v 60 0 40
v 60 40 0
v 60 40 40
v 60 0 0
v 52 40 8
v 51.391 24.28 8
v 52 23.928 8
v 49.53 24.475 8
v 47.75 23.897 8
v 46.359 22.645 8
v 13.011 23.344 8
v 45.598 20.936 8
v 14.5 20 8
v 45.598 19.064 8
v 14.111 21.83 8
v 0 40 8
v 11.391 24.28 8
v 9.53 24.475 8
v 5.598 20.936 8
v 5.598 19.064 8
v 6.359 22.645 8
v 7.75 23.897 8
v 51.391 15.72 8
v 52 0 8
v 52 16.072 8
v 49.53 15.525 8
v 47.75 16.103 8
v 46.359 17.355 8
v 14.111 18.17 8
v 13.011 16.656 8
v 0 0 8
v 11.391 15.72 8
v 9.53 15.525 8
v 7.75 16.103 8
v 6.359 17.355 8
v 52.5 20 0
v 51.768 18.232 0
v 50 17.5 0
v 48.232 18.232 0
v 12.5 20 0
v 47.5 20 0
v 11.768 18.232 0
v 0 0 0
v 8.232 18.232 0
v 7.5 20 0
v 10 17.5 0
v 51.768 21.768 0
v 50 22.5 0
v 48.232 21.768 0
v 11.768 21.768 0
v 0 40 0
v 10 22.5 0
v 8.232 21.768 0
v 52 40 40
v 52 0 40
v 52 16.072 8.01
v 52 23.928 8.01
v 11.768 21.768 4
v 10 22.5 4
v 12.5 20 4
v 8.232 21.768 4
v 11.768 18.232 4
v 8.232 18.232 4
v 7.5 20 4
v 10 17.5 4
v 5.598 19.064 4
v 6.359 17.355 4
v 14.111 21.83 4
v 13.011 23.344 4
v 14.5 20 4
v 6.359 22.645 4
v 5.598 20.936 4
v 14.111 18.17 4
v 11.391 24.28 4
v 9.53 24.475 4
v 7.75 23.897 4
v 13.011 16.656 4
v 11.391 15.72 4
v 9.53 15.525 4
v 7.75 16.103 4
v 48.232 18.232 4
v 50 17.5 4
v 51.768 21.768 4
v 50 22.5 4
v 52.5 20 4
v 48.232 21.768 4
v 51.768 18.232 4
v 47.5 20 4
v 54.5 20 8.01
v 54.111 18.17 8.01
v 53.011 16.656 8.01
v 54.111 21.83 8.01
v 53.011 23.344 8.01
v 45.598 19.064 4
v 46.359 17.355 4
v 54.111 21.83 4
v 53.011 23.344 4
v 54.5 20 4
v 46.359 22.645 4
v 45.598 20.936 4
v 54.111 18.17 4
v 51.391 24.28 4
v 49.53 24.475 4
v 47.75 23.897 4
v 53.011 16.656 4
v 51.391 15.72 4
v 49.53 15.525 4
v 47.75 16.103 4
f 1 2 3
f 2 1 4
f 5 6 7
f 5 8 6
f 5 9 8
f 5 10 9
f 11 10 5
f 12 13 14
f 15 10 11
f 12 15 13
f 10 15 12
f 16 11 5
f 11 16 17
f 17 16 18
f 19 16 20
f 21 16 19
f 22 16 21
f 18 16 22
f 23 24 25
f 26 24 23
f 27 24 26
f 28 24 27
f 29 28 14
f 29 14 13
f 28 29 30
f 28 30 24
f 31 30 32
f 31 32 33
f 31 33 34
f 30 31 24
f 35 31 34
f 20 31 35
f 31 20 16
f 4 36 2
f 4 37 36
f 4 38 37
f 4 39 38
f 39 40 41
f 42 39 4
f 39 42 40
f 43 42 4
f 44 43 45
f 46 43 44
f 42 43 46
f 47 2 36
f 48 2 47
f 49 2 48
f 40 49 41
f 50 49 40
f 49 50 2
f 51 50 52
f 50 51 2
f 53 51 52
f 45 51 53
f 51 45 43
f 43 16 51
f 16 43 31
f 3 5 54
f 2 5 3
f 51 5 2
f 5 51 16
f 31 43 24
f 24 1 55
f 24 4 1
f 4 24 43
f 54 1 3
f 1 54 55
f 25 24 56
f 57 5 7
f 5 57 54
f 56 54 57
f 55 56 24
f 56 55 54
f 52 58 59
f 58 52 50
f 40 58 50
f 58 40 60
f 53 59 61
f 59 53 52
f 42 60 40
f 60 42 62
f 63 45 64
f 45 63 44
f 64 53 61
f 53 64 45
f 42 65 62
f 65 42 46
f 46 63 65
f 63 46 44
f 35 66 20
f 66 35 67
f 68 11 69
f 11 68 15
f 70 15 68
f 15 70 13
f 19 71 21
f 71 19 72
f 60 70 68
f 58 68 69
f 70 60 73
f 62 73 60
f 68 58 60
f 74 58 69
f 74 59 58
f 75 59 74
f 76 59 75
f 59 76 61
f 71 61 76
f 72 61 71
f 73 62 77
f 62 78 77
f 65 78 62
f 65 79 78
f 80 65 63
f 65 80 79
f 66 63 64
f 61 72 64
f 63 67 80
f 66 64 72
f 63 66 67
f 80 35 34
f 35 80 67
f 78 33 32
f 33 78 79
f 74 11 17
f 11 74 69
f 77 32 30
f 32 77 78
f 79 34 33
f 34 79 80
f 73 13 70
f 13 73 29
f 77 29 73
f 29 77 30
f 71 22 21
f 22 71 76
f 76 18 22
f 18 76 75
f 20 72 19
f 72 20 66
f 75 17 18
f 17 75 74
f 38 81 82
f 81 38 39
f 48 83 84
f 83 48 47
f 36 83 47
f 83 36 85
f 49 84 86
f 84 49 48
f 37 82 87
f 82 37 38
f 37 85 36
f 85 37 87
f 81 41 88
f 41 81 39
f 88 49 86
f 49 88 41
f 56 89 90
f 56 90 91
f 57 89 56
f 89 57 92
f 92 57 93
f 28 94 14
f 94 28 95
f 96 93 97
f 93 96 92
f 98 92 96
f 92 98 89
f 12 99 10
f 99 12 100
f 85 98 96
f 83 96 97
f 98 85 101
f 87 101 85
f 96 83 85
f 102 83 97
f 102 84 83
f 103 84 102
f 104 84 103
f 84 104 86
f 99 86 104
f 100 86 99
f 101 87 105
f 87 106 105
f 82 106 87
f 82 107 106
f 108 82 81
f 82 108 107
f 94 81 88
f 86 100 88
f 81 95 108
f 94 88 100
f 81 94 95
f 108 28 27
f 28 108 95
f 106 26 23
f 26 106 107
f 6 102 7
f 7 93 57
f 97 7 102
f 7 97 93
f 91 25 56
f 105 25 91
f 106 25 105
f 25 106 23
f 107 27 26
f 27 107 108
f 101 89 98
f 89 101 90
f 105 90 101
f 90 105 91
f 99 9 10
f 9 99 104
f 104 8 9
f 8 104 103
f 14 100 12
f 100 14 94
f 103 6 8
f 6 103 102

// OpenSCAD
// file: ../lib/hole.scad
// lib/hole.scad — 公共孔模块
// 放在 z = 0 平面上方打孔，depth 默认穿透 100mm
module hole(x = 0, y = 0, d = 3, depth = 100, counterbore = 0, cb_depth = 3) {
  // counterbore > 0 时生成沉头孔（沉头直径由调用方用 d 推或自行扩展）
  translate([x, y, -0.01])
    cylinder(h = depth + 0.02, d = d);
}

module counterbore_hole(x = 0, y = 0, d = 3, cb_d = 0, cb_depth = 3, depth = 100) {
  // d      : 通孔直径
  // cb_d   : 沉头直径（0 = 普通孔）
  // cb_depth: 沉头深度
  union() {
    translate([x, y, -0.01]) cylinder(h = depth + 0.02, d = d);
    if (cb_d > d)
      translate([x, y, depth - cb_depth])
        cylinder(h = cb_depth + 0.01, d = cb_d);
  }
}

// 圆周孔阵: n 个孔均布在半径 r 上
module hole_circle(center_x = 0, center_y = 0, r = 20, n = 4, d = 3, depth = 100) {
  for (i = [0:n-1])
    hole(x = center_x + r * cos(i * 360 / n),
         y = center_y + r * sin(i * 360 / n),
         d = d, depth = depth);
}

// 简单倒角方块（用 minkowski + sphere）
module chamfered_box(size, c = 1) {
  minkowski() {
    scale([1,1,1]) {
      // 先生成略小的实体
      offset(delta = -c, center = true)
        translate([c,c,c]) box(size, center = [false,false,false]);
    }
    sphere(r = c, $fn = 24);
  }
}
// main file
// models/001-bracket.scad — 示例：L 型支架，带 4 个安装孔
// 用法: ./scripts/build.sh models/001-bracket.scad png
include <../lib/hole.scad>

// ===== 参数区 =====
a_len  = 60;   // 底臂长度
a_w    = 40;   // 底臂宽度
b_len  = 40;   // 立臂长度
t      = 8;    // 板厚
f_hole_d  = 5; // 安装孔直径
f_cb_d    = 9; // 沉头直径
f_cb_depth= 4; // 沉头深度
// ==================

echo("bracket: $a_len x $a_w x $b_len, t=$t");

difference() {
  union() {
    // 底臂
    translate([0, 0, 0])
      cube([a_len, a_w, t], center = [false, false, false]);
    // 立臂
    translate([a_len - t, 0, 0])
      cube([t, a_w, b_len], center = [false, false, false]);
  }
  // 底臂安装孔（沉头从顶面朝下）
  counterbore_hole(x = 10, y = a_w/2, d = f_hole_d, cb_d = f_cb_d, cb_depth = f_cb_depth, depth = t);
  counterbore_hole(x = a_len - 10, y = a_w/2, d = f_hole_d, cb_d = f_cb_d, cb_depth = f_cb_depth, depth = t);
}
